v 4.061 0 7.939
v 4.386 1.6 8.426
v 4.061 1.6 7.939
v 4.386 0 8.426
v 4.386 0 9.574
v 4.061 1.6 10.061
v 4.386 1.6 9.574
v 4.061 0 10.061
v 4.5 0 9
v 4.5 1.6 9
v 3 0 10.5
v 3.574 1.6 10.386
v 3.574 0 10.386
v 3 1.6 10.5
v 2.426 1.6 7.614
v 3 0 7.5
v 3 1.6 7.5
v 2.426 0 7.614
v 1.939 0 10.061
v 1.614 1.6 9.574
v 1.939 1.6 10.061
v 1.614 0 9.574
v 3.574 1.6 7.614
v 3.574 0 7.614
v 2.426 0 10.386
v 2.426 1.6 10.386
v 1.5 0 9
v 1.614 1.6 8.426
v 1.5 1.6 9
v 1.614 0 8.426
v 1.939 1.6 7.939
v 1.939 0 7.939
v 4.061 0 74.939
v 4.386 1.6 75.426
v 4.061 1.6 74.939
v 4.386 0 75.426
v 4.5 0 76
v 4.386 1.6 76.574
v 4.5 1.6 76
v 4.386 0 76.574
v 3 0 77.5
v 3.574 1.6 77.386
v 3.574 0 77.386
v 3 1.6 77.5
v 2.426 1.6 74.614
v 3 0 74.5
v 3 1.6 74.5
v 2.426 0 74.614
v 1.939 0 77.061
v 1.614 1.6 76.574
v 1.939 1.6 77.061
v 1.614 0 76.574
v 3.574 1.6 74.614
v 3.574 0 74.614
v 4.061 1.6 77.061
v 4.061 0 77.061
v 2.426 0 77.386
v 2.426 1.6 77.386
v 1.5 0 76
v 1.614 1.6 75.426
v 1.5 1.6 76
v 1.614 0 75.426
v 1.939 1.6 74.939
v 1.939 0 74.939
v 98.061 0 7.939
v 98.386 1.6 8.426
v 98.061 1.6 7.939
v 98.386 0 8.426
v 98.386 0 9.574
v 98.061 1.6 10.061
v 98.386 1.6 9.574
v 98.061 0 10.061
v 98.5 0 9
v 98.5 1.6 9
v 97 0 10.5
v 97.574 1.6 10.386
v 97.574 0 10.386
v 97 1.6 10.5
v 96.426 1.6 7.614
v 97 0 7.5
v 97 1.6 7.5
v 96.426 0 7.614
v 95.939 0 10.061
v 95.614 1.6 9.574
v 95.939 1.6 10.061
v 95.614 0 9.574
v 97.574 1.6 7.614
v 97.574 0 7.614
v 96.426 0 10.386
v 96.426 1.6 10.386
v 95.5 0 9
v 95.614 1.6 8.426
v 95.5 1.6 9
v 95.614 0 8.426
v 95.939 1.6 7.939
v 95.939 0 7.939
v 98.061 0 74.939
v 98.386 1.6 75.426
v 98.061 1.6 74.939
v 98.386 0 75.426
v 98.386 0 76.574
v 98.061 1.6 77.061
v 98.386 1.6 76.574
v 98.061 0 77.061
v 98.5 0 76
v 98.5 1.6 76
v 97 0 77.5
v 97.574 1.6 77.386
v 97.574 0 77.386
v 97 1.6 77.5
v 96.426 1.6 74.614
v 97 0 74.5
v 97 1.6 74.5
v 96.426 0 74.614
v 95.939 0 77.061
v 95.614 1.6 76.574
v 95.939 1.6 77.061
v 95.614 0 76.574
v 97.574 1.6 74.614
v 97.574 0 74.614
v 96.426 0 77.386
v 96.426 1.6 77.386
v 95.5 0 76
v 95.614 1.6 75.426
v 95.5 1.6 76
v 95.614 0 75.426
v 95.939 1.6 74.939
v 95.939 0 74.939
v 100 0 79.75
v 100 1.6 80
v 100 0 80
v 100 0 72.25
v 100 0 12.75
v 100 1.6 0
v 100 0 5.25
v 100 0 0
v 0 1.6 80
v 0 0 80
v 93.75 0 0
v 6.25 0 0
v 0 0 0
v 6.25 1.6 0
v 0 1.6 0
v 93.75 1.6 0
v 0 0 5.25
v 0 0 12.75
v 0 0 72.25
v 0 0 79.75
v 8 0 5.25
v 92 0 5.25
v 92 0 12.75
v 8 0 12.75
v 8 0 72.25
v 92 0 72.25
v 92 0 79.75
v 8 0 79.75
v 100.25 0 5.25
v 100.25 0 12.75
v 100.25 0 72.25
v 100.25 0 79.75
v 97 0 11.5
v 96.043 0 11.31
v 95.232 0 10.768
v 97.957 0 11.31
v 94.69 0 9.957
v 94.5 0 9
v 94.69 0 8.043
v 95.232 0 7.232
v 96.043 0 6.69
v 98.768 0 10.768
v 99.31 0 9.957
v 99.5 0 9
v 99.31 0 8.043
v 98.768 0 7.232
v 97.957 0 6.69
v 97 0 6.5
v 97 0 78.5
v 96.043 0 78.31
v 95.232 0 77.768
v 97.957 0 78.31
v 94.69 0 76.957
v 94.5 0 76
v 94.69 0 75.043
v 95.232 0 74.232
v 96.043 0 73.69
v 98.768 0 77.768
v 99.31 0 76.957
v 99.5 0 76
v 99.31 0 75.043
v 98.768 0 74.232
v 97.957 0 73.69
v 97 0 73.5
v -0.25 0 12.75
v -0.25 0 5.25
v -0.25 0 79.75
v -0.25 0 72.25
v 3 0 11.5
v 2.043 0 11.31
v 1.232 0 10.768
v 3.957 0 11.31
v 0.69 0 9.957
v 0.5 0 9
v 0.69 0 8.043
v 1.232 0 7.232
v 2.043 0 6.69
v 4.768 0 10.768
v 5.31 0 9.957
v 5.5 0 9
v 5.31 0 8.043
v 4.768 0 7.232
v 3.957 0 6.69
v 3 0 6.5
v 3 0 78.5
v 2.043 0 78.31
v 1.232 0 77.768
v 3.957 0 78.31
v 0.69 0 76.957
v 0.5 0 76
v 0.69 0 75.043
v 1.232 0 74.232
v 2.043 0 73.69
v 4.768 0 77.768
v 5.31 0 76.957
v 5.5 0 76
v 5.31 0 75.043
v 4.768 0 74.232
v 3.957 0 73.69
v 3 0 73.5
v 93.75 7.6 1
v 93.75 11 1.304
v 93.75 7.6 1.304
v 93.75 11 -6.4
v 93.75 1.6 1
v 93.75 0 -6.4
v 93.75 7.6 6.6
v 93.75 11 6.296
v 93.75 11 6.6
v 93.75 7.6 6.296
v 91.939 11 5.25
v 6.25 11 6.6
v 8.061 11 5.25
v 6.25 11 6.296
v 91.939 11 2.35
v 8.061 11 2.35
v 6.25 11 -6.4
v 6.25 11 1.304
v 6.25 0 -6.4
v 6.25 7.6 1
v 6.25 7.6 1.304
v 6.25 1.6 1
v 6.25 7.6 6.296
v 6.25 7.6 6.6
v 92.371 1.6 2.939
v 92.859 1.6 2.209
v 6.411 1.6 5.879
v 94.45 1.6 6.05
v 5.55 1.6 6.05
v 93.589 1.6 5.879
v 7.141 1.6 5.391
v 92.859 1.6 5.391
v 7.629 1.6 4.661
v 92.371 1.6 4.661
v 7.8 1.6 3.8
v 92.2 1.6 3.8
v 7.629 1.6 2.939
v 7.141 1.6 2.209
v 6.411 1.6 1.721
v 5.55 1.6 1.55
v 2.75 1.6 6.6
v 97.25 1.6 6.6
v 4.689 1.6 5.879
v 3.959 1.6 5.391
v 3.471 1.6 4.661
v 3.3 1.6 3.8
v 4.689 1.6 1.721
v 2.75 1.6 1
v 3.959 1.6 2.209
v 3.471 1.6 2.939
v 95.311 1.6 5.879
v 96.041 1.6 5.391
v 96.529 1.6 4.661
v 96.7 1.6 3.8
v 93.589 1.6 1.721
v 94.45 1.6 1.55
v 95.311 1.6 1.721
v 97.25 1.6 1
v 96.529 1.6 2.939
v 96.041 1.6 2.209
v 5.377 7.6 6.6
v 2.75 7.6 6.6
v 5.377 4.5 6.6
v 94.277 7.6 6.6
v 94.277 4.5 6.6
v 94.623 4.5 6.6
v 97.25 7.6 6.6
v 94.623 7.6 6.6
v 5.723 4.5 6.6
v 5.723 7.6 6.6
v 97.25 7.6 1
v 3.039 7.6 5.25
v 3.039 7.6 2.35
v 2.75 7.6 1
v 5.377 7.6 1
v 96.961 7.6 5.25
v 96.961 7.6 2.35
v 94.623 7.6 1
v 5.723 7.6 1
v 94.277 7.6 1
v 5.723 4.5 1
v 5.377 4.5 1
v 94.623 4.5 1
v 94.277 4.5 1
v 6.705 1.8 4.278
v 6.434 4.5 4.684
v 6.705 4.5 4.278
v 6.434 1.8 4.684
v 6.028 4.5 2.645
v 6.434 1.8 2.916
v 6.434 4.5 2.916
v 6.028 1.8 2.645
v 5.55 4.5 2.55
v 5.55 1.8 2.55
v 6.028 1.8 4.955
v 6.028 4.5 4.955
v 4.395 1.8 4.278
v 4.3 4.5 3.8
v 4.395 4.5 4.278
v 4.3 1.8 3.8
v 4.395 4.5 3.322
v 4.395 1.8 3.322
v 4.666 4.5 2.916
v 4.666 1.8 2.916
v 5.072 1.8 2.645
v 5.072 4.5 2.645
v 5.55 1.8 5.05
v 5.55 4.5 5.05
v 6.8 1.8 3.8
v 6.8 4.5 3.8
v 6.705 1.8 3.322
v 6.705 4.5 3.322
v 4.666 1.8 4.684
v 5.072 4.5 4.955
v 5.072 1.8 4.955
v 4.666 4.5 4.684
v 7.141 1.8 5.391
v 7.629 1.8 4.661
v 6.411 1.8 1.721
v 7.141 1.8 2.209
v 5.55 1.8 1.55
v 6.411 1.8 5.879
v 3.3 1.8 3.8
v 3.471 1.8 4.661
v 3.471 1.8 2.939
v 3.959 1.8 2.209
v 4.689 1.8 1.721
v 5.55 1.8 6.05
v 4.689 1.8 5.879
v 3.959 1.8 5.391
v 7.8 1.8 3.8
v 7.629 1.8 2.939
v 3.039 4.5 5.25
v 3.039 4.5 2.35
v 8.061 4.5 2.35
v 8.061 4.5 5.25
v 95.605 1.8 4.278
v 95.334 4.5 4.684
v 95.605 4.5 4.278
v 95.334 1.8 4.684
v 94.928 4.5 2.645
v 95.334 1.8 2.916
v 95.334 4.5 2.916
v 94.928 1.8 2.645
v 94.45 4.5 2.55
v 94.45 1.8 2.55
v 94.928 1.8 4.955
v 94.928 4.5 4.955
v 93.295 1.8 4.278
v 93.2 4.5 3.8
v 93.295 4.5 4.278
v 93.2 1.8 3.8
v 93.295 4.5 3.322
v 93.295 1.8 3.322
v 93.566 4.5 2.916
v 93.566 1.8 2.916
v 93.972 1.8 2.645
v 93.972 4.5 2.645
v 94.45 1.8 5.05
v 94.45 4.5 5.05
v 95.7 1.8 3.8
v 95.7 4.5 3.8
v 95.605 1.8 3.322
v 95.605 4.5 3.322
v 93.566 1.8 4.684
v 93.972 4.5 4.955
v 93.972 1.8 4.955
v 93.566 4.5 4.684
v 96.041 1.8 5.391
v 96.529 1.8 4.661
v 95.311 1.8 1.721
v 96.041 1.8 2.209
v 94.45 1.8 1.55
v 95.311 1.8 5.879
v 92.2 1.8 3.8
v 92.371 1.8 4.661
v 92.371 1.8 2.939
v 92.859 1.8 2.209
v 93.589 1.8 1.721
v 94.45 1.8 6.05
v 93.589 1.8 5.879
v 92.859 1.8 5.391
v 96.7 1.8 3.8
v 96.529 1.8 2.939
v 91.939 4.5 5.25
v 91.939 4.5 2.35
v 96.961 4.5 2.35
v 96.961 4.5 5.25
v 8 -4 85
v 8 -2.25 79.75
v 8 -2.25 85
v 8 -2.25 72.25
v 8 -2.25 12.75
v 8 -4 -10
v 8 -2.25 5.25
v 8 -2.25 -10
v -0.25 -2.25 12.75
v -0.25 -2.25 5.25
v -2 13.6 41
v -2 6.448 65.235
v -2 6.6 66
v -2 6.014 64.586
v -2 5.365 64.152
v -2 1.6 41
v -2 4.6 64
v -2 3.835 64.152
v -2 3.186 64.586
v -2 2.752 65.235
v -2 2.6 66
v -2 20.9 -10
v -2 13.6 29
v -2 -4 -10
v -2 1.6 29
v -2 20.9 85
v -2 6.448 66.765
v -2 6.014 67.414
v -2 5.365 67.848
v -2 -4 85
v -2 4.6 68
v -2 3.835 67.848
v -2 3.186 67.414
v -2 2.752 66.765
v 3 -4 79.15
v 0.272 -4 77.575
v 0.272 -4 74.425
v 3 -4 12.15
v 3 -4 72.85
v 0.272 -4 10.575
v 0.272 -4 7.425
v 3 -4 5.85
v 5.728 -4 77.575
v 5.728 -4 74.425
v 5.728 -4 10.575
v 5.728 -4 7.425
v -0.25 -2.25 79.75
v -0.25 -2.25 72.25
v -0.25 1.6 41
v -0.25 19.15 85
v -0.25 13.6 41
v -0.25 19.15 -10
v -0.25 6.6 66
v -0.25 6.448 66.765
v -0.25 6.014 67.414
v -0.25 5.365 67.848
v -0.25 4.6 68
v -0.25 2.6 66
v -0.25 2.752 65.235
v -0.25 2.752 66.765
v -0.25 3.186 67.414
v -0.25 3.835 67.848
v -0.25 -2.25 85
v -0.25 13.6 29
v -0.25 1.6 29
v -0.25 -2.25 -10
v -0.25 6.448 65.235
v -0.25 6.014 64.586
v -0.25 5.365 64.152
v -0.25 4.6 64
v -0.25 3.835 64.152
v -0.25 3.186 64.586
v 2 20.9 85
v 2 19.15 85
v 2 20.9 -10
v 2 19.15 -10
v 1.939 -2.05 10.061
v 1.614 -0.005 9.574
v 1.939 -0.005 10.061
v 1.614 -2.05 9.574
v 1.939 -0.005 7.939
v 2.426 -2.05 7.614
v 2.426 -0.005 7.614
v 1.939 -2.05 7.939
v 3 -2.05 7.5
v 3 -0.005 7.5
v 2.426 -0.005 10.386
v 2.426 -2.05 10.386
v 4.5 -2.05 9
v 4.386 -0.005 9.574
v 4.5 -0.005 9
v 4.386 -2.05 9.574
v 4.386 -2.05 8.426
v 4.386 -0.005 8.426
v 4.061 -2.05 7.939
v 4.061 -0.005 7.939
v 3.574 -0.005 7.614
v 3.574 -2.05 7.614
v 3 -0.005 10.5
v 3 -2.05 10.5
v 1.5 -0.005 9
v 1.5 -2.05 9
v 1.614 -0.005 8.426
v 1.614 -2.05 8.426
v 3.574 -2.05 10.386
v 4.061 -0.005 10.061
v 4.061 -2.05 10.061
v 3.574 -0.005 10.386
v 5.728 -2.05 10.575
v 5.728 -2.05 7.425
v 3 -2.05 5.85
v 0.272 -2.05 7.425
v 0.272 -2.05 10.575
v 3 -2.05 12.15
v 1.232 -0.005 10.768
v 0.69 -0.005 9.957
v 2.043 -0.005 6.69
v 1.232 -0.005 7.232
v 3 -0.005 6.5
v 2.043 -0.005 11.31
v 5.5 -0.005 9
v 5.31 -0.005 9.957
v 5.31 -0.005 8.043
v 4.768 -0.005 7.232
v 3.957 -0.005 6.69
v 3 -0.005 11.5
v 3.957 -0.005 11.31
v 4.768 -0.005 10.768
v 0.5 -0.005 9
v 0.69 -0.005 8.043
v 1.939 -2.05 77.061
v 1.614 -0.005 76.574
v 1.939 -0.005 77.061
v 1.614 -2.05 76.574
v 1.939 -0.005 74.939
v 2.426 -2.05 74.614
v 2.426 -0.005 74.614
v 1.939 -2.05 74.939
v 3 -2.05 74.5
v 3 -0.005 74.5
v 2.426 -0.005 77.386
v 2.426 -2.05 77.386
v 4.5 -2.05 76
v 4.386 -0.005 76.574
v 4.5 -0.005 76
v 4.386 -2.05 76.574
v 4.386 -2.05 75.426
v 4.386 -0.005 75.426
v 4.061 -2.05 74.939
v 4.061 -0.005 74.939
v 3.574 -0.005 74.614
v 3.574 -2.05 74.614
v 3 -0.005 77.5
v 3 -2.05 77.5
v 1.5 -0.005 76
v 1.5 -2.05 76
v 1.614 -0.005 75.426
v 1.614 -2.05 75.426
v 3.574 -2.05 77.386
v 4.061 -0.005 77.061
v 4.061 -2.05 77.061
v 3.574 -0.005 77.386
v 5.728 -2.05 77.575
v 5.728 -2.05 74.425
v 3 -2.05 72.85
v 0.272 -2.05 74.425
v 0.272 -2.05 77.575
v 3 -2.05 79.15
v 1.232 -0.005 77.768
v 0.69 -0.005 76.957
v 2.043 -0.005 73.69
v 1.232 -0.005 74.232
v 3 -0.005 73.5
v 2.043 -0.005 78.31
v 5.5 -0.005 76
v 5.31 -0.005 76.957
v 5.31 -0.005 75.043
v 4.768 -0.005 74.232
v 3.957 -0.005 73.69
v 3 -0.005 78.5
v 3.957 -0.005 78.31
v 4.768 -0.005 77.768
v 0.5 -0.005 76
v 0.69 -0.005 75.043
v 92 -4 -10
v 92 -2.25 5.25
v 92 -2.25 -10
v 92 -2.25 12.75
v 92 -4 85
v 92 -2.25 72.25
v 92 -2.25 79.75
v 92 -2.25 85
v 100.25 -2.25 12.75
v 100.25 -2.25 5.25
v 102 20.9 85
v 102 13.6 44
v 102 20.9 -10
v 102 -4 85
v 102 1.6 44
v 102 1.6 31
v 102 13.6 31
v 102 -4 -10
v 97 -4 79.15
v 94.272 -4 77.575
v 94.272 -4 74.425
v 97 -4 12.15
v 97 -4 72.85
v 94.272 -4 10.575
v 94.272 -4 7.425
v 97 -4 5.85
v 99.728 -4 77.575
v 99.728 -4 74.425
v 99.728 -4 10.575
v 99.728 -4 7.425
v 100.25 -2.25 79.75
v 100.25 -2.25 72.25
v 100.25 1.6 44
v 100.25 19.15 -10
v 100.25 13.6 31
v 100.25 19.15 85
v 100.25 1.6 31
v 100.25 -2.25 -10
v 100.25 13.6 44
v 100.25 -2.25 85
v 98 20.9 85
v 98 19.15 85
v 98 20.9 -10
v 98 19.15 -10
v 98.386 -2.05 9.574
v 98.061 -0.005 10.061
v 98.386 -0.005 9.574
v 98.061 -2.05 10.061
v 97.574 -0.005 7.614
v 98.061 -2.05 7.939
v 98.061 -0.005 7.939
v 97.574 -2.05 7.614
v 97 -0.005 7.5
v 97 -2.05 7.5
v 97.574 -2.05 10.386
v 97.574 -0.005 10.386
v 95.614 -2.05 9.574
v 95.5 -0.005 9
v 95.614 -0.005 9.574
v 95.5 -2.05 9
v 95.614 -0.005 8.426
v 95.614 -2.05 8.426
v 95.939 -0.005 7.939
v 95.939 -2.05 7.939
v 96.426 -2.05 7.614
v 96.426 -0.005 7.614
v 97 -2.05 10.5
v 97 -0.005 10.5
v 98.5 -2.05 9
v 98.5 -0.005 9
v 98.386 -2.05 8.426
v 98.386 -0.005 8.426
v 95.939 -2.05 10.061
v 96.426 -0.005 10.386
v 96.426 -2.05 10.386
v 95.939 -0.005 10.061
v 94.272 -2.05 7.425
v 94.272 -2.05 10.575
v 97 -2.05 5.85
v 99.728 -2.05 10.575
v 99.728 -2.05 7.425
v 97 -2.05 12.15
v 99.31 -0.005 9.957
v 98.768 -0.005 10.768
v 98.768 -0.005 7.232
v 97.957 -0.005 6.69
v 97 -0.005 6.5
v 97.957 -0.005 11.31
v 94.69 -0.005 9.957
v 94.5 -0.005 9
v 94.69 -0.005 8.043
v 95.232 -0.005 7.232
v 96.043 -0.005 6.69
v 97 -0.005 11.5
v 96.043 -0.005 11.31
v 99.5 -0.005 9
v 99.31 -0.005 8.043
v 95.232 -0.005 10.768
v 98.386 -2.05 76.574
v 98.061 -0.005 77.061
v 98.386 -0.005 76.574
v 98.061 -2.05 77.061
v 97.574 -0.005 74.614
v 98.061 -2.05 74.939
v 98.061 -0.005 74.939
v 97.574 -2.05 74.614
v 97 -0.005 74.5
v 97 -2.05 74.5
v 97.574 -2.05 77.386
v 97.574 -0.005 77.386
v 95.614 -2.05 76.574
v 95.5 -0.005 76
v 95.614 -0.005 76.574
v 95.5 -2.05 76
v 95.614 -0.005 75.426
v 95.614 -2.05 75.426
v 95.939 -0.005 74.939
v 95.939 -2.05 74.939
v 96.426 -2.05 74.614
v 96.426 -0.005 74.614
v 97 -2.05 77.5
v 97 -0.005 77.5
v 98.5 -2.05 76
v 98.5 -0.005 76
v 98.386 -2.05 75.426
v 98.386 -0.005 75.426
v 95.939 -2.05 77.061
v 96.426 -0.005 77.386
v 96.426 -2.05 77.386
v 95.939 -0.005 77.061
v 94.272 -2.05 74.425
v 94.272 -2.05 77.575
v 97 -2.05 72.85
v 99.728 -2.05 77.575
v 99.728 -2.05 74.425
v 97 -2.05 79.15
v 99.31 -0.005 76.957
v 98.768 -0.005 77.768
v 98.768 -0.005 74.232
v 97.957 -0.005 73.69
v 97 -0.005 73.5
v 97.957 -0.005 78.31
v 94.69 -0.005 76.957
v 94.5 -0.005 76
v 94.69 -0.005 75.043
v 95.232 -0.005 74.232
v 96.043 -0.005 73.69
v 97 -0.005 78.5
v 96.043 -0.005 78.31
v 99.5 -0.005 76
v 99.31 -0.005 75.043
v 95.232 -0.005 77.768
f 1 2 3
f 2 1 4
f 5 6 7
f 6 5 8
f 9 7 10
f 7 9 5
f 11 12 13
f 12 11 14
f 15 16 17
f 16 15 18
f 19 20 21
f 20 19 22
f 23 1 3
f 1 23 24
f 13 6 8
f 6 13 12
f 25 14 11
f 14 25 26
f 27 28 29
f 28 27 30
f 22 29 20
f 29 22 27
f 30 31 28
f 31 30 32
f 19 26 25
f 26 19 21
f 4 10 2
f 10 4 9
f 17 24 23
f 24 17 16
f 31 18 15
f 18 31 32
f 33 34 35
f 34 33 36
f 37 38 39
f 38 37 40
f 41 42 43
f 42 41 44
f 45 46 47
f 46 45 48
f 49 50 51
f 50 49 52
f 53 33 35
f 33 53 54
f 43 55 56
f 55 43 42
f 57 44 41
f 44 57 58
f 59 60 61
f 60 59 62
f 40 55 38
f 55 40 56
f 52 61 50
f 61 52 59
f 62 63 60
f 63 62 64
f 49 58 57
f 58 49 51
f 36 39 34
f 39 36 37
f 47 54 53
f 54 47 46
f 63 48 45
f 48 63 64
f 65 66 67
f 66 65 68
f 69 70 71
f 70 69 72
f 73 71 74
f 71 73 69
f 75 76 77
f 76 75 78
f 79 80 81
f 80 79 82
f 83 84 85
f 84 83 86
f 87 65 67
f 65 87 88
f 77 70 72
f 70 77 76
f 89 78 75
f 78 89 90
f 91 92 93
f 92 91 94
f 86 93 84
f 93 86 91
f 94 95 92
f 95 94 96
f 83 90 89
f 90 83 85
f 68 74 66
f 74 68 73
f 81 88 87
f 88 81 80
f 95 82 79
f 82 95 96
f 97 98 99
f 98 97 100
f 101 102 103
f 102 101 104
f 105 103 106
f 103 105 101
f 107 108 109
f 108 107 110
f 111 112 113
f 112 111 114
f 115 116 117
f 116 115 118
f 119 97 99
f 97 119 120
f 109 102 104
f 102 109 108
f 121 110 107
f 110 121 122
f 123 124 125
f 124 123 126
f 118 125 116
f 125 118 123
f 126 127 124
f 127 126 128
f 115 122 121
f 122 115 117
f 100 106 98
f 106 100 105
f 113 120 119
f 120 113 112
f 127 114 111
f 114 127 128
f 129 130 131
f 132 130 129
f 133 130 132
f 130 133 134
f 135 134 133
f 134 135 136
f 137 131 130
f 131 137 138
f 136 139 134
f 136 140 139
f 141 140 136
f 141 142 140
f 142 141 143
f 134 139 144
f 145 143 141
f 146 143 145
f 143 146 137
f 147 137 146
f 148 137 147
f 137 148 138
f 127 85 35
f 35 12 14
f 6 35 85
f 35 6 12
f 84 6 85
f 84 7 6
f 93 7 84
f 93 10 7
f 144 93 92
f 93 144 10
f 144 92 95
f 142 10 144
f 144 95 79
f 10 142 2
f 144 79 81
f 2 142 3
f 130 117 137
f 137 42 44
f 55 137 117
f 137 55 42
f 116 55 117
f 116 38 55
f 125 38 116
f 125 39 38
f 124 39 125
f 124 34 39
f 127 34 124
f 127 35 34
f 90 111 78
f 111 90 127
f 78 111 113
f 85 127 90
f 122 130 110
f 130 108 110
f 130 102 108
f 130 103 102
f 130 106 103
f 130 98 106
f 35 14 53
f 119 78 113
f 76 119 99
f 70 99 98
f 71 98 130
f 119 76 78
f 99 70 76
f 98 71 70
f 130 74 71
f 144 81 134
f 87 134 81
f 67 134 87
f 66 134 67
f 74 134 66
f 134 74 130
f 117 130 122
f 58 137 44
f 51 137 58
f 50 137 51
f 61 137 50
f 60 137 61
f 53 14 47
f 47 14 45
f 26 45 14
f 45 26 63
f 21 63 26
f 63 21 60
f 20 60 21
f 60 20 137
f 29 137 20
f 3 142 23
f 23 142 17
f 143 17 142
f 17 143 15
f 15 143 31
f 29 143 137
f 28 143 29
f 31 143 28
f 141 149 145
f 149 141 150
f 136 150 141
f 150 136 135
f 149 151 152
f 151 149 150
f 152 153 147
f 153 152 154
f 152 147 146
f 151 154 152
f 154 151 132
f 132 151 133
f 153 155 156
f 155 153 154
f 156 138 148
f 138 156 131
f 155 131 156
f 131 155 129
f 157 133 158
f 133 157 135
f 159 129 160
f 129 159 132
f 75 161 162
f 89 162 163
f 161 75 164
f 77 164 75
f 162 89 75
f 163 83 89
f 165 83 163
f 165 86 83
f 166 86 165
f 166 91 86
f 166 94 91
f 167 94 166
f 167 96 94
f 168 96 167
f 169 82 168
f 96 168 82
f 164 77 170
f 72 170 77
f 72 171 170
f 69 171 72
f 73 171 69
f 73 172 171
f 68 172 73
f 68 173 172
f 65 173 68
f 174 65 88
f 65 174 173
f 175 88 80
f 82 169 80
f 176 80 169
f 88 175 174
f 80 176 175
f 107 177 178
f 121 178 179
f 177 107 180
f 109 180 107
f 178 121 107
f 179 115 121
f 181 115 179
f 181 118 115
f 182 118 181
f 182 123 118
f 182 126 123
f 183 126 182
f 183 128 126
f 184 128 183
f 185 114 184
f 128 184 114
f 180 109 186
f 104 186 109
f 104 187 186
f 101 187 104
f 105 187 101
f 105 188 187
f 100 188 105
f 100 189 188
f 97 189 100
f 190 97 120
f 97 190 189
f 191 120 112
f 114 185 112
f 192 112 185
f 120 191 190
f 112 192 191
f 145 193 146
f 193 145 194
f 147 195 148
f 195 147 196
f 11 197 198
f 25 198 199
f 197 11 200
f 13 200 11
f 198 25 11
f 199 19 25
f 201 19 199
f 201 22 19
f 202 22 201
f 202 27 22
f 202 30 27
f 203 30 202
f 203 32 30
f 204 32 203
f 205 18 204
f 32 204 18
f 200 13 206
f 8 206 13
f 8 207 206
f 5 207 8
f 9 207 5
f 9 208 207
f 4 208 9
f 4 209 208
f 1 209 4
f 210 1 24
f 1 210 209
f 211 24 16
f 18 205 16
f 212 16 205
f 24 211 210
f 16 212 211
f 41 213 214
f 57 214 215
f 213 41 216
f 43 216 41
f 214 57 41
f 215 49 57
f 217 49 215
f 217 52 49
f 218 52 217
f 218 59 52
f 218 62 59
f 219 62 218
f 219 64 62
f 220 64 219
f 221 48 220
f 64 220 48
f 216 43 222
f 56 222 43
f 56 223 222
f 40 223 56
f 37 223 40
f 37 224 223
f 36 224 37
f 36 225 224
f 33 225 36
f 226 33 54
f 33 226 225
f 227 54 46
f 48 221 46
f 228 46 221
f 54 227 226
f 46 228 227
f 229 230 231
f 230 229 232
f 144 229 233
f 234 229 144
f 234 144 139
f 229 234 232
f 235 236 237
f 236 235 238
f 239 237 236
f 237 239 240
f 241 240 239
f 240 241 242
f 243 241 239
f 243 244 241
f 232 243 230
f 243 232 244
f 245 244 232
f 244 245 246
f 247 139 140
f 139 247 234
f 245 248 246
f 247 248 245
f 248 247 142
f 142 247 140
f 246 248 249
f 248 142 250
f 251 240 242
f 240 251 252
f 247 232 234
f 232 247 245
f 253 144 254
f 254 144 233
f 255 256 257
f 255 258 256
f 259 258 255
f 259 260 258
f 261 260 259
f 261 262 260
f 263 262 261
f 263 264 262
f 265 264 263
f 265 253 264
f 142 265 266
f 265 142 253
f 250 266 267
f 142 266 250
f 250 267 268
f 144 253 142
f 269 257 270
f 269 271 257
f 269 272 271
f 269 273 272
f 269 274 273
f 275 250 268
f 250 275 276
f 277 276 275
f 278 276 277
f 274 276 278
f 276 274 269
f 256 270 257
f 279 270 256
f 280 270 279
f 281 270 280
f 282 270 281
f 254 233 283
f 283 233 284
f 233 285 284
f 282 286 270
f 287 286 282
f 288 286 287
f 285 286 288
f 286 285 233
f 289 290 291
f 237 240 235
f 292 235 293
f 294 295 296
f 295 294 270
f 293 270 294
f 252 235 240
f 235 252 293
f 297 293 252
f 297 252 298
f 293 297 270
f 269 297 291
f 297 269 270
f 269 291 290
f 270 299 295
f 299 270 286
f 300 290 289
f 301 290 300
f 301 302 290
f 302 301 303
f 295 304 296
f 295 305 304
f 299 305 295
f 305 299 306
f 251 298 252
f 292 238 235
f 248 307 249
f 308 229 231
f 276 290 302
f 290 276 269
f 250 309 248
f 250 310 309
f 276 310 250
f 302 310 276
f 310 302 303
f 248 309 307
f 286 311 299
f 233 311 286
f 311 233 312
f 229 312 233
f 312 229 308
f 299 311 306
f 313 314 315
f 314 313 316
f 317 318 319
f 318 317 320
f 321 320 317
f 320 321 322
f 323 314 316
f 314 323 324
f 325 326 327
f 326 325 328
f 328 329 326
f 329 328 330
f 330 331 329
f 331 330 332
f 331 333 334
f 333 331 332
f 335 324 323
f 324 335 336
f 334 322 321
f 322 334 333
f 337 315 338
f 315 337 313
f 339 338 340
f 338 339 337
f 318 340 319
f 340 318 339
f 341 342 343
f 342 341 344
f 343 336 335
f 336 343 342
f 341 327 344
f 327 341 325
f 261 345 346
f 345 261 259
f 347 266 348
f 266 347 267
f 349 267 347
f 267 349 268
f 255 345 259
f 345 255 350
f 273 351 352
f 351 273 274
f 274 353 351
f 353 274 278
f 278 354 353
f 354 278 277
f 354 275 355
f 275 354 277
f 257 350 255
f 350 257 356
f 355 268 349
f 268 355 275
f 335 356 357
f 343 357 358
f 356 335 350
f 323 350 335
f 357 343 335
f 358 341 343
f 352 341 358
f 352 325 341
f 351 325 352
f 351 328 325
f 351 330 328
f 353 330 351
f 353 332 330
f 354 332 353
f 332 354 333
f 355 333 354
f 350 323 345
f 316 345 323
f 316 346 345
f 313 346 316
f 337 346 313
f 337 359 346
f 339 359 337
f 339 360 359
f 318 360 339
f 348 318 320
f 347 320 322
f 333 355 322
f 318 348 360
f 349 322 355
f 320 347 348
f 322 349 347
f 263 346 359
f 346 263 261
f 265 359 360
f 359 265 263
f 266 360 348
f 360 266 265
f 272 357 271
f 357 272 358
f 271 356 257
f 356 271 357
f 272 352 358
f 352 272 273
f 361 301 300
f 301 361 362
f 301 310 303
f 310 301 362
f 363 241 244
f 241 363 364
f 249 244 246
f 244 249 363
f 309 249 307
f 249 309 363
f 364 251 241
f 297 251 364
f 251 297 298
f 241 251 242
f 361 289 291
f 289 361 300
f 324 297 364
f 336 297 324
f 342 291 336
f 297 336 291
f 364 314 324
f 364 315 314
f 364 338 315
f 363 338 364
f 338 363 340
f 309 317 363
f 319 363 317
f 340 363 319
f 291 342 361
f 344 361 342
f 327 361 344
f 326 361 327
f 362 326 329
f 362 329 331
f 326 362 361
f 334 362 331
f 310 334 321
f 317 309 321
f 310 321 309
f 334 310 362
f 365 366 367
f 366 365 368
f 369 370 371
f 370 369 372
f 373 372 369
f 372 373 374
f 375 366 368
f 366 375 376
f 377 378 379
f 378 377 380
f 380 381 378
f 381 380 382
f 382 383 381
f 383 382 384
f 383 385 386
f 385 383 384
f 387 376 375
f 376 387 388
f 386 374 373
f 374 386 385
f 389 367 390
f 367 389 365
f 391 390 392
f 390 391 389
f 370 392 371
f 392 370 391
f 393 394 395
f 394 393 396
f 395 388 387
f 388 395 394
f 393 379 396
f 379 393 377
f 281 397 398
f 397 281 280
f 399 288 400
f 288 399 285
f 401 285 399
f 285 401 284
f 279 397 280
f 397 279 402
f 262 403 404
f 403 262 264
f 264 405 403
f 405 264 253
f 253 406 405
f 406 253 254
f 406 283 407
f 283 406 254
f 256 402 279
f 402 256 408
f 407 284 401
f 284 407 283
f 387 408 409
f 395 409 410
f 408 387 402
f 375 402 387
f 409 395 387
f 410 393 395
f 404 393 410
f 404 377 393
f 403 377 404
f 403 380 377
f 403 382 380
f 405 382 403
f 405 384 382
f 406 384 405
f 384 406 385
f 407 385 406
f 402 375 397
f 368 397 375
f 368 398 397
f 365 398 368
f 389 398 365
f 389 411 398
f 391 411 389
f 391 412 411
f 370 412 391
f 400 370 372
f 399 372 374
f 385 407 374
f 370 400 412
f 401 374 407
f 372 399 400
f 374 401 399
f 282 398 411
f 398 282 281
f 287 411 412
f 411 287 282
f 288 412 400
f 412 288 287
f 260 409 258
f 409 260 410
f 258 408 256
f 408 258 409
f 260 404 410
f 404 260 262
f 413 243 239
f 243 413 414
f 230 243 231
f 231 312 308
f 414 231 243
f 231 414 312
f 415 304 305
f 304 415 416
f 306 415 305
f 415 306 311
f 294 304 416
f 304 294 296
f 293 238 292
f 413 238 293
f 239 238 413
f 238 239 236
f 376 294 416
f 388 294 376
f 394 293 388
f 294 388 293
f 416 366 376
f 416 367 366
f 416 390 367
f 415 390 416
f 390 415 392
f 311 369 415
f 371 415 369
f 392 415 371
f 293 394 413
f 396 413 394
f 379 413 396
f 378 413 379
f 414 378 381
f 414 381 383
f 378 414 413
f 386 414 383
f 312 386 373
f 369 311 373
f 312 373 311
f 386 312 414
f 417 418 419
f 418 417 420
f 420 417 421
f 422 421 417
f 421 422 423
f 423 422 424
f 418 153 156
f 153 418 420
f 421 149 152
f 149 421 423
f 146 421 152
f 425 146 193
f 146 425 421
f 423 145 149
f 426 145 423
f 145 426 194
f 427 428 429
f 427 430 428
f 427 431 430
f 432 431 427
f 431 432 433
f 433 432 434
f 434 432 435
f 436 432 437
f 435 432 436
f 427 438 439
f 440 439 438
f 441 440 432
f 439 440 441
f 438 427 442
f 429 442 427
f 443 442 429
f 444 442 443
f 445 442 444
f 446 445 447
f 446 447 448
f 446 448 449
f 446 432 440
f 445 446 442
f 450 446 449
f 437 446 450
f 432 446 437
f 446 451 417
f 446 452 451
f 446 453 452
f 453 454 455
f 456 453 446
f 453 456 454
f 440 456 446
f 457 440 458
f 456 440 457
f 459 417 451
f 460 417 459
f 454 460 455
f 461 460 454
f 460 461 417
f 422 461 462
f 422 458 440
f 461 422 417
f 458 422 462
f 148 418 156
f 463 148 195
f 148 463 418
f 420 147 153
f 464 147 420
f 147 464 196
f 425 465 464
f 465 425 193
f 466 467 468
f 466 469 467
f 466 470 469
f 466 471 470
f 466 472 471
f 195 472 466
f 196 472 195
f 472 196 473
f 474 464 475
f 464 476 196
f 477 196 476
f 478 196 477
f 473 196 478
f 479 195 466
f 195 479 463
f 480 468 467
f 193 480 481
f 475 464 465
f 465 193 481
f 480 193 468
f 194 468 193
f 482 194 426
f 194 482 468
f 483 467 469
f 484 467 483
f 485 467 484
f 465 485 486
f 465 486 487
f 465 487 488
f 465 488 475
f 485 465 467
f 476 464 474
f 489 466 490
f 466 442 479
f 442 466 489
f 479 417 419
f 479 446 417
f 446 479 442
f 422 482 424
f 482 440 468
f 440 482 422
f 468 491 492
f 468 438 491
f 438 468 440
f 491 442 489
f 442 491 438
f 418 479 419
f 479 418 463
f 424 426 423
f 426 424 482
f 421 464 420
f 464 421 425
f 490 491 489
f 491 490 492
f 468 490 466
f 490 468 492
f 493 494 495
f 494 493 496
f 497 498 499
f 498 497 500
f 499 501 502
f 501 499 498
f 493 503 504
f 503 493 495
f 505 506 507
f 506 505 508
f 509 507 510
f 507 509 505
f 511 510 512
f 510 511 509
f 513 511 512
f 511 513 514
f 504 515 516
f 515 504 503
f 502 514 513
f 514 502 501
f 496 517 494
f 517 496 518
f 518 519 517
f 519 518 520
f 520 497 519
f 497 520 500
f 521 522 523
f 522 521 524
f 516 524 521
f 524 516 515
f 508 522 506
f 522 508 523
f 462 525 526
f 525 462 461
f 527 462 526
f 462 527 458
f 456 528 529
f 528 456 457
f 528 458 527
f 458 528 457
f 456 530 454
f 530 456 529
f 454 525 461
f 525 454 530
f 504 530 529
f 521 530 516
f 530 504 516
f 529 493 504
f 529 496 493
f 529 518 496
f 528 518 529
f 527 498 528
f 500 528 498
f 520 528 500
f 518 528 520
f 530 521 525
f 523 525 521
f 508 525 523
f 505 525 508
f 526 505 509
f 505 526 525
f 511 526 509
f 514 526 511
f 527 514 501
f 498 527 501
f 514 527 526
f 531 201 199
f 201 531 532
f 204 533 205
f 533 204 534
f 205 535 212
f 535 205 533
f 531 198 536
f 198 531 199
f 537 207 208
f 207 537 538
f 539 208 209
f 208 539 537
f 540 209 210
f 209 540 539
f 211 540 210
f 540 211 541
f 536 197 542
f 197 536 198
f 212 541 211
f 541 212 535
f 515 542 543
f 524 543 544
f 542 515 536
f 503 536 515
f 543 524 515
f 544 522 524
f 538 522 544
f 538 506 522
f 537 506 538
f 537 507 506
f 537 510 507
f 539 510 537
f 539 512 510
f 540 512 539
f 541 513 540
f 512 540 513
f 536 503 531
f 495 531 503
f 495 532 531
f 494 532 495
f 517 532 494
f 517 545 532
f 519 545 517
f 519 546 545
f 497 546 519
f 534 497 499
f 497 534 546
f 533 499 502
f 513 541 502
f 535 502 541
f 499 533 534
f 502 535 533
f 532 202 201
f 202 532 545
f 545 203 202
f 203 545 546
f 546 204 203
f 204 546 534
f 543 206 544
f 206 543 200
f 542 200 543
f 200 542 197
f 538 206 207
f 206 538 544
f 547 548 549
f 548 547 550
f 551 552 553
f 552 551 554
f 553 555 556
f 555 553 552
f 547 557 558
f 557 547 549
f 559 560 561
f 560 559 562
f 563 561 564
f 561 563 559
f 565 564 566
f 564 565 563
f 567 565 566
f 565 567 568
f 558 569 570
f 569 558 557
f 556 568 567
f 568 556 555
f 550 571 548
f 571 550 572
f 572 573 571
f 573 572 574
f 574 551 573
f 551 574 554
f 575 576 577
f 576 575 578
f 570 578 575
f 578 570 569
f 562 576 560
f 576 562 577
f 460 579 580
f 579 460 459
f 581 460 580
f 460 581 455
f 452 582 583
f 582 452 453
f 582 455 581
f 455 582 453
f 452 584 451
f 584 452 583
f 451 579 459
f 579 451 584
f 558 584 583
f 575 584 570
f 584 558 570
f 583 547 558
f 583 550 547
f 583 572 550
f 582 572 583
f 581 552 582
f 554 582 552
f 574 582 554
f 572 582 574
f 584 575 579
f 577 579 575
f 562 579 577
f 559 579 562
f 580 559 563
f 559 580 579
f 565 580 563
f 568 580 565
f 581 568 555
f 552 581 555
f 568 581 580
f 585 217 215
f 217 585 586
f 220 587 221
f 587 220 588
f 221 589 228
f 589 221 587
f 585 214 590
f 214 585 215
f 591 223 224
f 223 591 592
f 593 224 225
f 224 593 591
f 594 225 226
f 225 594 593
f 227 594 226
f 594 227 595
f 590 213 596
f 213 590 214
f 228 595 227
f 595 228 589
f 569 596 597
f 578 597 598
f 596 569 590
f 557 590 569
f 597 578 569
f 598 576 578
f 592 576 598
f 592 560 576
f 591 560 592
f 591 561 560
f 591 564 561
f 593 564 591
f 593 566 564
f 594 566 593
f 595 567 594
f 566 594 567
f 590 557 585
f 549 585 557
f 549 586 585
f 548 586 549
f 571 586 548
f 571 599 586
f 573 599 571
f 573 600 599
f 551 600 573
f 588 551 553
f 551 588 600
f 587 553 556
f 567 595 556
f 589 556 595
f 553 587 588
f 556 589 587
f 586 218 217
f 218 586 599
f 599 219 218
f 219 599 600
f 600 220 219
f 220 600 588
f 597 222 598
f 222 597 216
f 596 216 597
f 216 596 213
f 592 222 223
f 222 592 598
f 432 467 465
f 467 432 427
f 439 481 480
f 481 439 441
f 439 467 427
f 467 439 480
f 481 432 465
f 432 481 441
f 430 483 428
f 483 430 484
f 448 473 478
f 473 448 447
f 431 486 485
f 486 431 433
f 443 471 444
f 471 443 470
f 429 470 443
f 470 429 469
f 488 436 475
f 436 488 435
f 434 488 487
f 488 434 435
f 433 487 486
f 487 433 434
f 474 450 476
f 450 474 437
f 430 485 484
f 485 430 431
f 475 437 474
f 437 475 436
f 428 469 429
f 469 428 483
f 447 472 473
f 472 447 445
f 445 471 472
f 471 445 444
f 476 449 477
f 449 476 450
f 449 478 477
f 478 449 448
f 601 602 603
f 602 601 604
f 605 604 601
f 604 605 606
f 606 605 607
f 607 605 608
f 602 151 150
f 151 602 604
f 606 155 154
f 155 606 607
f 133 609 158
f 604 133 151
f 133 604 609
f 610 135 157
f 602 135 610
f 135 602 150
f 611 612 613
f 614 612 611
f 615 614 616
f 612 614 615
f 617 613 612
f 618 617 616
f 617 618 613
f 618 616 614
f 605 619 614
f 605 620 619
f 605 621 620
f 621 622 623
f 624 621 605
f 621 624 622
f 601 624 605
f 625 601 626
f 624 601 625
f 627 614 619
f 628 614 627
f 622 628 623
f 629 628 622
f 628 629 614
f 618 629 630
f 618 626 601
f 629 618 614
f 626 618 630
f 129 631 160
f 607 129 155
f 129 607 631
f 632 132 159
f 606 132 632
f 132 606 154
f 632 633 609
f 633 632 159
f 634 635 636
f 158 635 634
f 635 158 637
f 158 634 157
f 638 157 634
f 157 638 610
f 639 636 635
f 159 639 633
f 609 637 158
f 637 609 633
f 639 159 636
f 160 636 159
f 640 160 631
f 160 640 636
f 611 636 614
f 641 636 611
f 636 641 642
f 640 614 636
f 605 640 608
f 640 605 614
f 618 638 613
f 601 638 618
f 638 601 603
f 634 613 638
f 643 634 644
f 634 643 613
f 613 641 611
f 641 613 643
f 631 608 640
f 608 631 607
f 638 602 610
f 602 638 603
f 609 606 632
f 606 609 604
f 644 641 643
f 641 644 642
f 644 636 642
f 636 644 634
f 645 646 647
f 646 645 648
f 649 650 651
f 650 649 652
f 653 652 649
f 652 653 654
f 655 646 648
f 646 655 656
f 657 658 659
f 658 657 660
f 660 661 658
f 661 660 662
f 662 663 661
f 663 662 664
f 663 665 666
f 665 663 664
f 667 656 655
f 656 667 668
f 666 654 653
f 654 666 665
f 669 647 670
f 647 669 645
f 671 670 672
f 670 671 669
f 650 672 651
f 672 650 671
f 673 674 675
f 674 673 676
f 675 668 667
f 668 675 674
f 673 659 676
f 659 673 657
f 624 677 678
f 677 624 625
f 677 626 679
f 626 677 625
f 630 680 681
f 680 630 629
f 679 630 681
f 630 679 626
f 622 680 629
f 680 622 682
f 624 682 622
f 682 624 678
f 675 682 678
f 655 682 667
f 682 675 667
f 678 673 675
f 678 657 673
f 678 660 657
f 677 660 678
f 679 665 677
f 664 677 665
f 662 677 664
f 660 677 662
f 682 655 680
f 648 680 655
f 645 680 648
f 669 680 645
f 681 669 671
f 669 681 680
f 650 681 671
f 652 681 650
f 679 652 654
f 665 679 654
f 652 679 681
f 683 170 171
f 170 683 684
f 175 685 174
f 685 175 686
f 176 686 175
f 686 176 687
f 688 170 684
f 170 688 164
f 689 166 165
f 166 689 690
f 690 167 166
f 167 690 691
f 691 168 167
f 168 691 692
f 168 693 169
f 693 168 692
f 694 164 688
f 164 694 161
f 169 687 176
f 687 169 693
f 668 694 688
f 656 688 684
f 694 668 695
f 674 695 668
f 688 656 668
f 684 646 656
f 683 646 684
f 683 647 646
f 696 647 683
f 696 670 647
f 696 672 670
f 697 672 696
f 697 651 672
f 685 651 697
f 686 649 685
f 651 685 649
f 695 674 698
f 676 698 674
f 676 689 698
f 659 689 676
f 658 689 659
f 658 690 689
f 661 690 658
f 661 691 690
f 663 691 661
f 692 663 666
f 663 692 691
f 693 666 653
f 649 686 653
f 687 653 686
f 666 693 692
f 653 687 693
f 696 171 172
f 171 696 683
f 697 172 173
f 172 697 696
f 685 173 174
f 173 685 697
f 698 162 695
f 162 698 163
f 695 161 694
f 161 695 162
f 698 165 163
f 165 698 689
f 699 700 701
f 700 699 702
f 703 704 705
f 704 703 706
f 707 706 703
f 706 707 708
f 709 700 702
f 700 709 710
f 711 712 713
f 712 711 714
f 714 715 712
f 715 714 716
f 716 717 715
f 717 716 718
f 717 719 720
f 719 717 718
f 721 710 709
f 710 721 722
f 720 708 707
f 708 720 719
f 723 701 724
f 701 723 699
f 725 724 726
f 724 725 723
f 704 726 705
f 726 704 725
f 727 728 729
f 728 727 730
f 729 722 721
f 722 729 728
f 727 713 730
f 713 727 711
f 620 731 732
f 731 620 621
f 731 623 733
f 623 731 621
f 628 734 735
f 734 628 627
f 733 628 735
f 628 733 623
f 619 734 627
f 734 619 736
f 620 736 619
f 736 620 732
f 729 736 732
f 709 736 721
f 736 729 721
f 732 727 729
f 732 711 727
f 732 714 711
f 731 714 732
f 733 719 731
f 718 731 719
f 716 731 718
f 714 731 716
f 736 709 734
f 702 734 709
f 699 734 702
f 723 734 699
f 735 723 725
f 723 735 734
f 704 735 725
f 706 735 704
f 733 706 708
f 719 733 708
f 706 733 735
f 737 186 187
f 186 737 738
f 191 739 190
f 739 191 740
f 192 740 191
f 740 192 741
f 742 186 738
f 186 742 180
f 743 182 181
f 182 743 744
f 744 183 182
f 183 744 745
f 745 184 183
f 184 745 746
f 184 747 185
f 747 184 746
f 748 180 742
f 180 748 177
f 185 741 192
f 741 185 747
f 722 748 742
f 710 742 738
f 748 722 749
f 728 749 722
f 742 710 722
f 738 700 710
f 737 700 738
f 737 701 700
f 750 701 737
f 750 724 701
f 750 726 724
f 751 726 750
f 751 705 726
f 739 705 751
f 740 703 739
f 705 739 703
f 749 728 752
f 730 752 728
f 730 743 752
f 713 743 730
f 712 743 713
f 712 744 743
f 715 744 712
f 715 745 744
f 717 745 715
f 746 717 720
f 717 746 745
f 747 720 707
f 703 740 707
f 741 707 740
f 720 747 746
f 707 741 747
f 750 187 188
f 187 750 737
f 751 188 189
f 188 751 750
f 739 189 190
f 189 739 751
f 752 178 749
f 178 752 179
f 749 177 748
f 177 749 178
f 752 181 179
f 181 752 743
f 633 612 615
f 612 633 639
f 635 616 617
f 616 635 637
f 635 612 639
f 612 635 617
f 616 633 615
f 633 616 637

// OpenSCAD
// file: ../library/din41612/din41612_male.scad
// din41612 male connector
// =======================

include <din41612_male_dim.scad>

use <../linurs/linurs_screw.scad>

module din41612_male(){ 
  // color("LightGrey")
  difference(){
    union(){
        translate([0,din41612_male_w1/2,din41612_male_h/2-din41612_male_h1])  
        cube([din41612_male_l1,
              din41612_male_w1,
              din41612_male_h],
             center=true);  
      translate([0,(din41612_male_w1-din41612_male_w)/2,(din41612_male_h-din41612_male_h1)/2]) 
        cube([din41612_male_l1,
              (din41612_male_w-din41612_male_w1),
              din41612_male_h-din41612_male_h1],
             center=true);  
      translate([0,din41612_male_w2/2+din41612_male_w1-din41612_male_w,din41612_male_h2/2])
        cube([din41612_male_l,
              din41612_male_w2,
              din41612_male_h2],
             center=true);  
    }
    for(i=[-1,1]){ // mounting holes
      translate([i*din41612_male_dl/2,
                 din41612_male_w1-din41612_male_w+din41612_male_w2/2, 
                 din41612_male_h1])
      rotate([180,0,90])screw_fix(
            w=din41612_male_h2, 
            d=M2_5, 
            type=head_cyl, 
            nut_sink=din41612_male_h,
            t=0);
    }
  }
}
din41612_male();  
// file: ../library/din41612/din41612_male_dim.scad
include <../linurs/linurs_screw_dim.scad>

// connector dimensions
din41612_male_l=94.5;    // lenght of the connector
din41612_male_l1=87.5;   // 
din41612_male_w=13;      // width of the connector
din41612_male_w1=6.4;    // 
din41612_male_w2=5.6;    // 
din41612_male_h=11;      // height of the connector
din41612_male_h1=1.6;    // 
din41612_male_h2=6;      // 

din41612_male_dl=88.9;   // distance between mounting holes
// file: ../library/din41612/din41612_female_dim.scad
include <../linurs/linurs_screw_dim.scad>

// connector dimensions
din41612_female_l=95;       // lenght of the connector
din41612_female_l1=85;      // lenght of the connector head
din41612_female_h=11.6;     // height of the connector
din41612_female_h1=5.2;     // height produced by the connector when pulgged in 
din41612_female_w=11;       // width of the connector
din41612_female_w1=8.5;     // width of the connector head

din41612_female_dl=90;      // distance between mounting holes
// file: ../pcb/pcb.scad
// pcb
// ===
// The pcb is the master object and has its 
// lower left corner solder side at the origin of the 
// coordinate system 

n=2;  // [1,2,3,4,5,6,7,8]
show_pcb="assemblies"; // [assemblies,assembly,pcb]

include <pcb_dim.scad>
include <../motherboard/motherboard_dim.scad>

use <../library/din41612/din41612_male.scad>

module pcb(){
  echo("pcb");  
  color("greenyellow")
  difference(){
    cube([pcb_l,pcb_h,pcb_w]); // pcb
    for(x=[-1,1]){ // mounting holes
      for(y=[pcb_wd1,pcb_wd1+pcb_wd]){
        translate([x*pcb_ld/2+pcb_l/2,0,y])
        rotate([90,0,0])
        cylinder(d=pcb_d,h=3*pcb_h,center=true,$fn=16);
      }
    }
  }
}

module pcb_assembly(){
  echo("pcb assembly");  
  pcb();  
  translate([pcb_l/2,pcb_h,0])  
  rotate([-90,0,0])din41612_male();  
}

module pcb_assemblies(n=1){
  echo("pcb assemblies"); 
  for(i=[0:n-1]){ // add the connectors
      echo(i);
      translate([0,step*i,0])
      pcb_assembly();
  }    
}    

if(show_pcb=="assemblies"){
  pcb_assemblies(n=n);
}

if(show_pcb=="assembly"){
  pcb_assembly();
}

if(show_pcb=="pcb"){
    // Move to center to create 2D drawings from top view 
    // with script OpenSCAD22d.py
    //
    rotate([90,0,180])
    //
    translate([-pcb_l/2,-pcb_h/2,-pcb_w/2])
    pcb();
}
// file: ../bracket/bracket.scad
// bracket
// =======
// A bracket of the elecbox module
// - type: 0 front bracket, 1 rear bracket
// - width 1..n in steps

// parameters for customizer
// bracket width
n=2; // [1,2,3,4,5,6,7,8]
// type
bracket="Front"; // [Front,Back]
// intermediate mounting holes
intermediate=false;  

include <../pcb/pcb_dim.scad>

include <../motherboard/motherboard_dim.scad>
include <../library/linurs/linurs_screw_dim.scad>
include <bracket_dim.scad>

use <../library/linurs/linurs_screw.scad>
    
module back_bracket(n=1, intermediate=false){
  mirror([1,0,0])       // mirror it if desired
  front_bracket(n=n, intermediate=intermediate); 
}
    
module front_bracket(n=1, intermediate=false){
  echo("bracket");  
  //color("White")
  intermediatestep=(intermediate)?step:0; 
  difference(){
    union(){
      translate([-bracket_h2/2-bracket_gap/2,
                 bracket_w(n)/2-bracket_w1,
                 bracket_l/2])  
      cube([bracket_h2,
            bracket_w(n),
            bracket_l],center=true); // create the bracket front
  
      translate([bracket_h/2-bracket_h2-bracket_gap/2,
                 bracket_t/2-bracket_w1,
                 bracket_l/2]) 
      cube([bracket_h,
            bracket_t,
            bracket_l],center=true); // U shape side of the screw
      
      translate([bracket_h1/2-bracket_h2-bracket_gap/2,
                 bracket_w(n)-bracket_w1-bracket_t/2,
                 bracket_l/2]) 
      cube([bracket_h1,
            bracket_t,
            bracket_l],center=true); // U shape where no screw  
      for(x=[1:n]){  // create the mounting hole cubes 
        for(z=[bracket_l1,
               bracket_l1+bracket_ld]){
          translate([ bracket_h/2-bracket_h2-bracket_gap/2,
                     -bracket_w1/2+(x-1)*intermediatestep,
                     z])
          cube([bracket_h,
                bracket_w1,
                bracket_l2],center=true);
        }
      }   
    }
    for(x=[1:n]){ // create the mounting hole 
      for(z=[bracket_l1,
             bracket_l1+bracket_ld]){
        translate([bracket_h3-bracket_h2-bracket_gap/2,
                  -bracket_w1/2+(x-1)*intermediatestep,
                   z])
        rotate([0,90,0])
        rotate([-90,0,0])
        screw_fix(w=bracket_w1,d=bracket_screw,type=head_no, t=bracket_screw_gap);
      }
    }
  }
}

if(bracket=="Front"){
  front_bracket(intermediate=intermediate,n=n);
}

if(bracket=="Back"){
  back_bracket(intermediate=intermediate,n=n);
}
// file: ../library/linurs/linurs_screw.scad
// Metric screws and nuts 
// urs@linurs.org 2019
// It is targeted for 3D printing applications. 
// To look realistic is not the goal (Example: Nuts do not have a hole)

include <linurs_screw_dim.scad>

d=0; //[0:M2_5,1:M3,2:M4,3:M5]
type=0;//[0:head_cyl,1:head_cnt,2:head_no,3:head_hex]
w=15; 
i=10;
nut_sink=0;
screw_sink=0; 
t=0.01;
fn=16;

/* [hex_bolt] */
show_hex_bolt=false;

/* [nut] */
show_nut=false;

/* [screw] */
show_screw=false;

/* [screw_fix] */
show_screw_fix=false;

/* [screw_cut] */
show_screw_cut=false;

/* [nut_cut] */
show_nut_cut=false;
wi=0; 
rot=false;

// functions used multiple times to position nuts and heads
function headh_cyl(d)=screw_cyl[d][1];  // height of cyl screw head
function headh_cnt(d)=screw_cyl[d][1];  // height of cnt screw head
function headh(d,type=head_cyl)=(type==head_cyl ? headh_cyl(d) : (type==head_cnt ? headh_cnt(d) : 0 )); // height of screw head 

function nuth(d)=screw_hex[d][2];   // height of hex nut

// head of a cylinder screw
module screw_head_cyl(d=M3, t=0)
{
  screwhd=screw_cyl[d][0]+t; // diameter of cylinder screw head
  cylinder(d=screwhd,h=headh(d=d, type=head_cyl), center=true,$fn=16); // screw head
}

// head of a countersunk screw
module screw_head_cnt(d=M3, t=0)
{
  screwd=screw_d[d]+t; 
  screwhd=screw_cnt[d][0]+t; // diameter of cylinder screw head
  cylinder(d1=screwd,d2=screwhd,h=headh(d=d,type=head_cnt), center=true,$fn=16); // screw head
}

// head of a hex screw
module screw_head_hex(d=M3, t=0)
{
    translate([0,0,-nuth(d)/2])nut(d=d, t=t);
}

// head of all screws
module screw_head(d=M3, type=head_cyl, t=0)
{ 
  if(type==head_cnt){
    screw_head_cnt(d=d, t=t);
  } else {
    if(type==head_cyl){
      screw_head_cyl(d=d, t=t);
    } else {
       if(type==head_hex){
           screw_head_hex(d=d, t=t); 
       } 
    }    
  }
}

// hex bolt 
module hex_bolt(d=M3, w=10, t=0)
{
  nutd=screw_hex[d][1]+t; // outer diameter of hex bolt
  cylinder(r=nutd/2,h=w+t, center=true,$fn=6); // nut
}

// nut 
module nut(d=M3, t=0)
{
  hex_bolt(d=d, w=nuth(d), t=t);    
}

// screw 
// w outer width of the screw = screw length + head 
module screw(w=10, d=M3, type=head_cyl, t=0){
  screwd=screw_d[d]+t;       // screw diameter
  cylinder(d=screwd, h=w, center=true,$fn=16); // screw thread length
  translate([0,0,w/2-headh(d=d,type=type)/2])
  screw_head(d=d,type=type, t=t);
}

// screw fix
// w outer width of the screw = screw length + head 
// sink additional material below to remove 
// raise additional material above to remove
module screw_fix(w=10, d=M3, type=head_cyl, screw_sink=0, nut_sink=0, t=0){
  screw(w=w, d=d, type=type, t=t);
  translate([0,0,-w/2+nuth(d)/2])
    nut(d=d,t=t);
  //additional material to be removed above the nut  
  translate([0,0,-(w+nut_sink)/2])hex_bolt(d=d,w=nut_sink+0.01,t=t);    
  //additional material to be removed above the screw head
  if(type==head_cnt){  
    translate([0,0,w/2+screw_sink])
    cylinder(d=screw_cnt[d][0]+t,h=screw_sink+0.01,center=true,$fn=16);
  }else{ 
    translate([0,0,(w+screw_sink)/2])
    cylinder(d=screw_cyl[d][0]+t,h=screw_sink+0.01,center=true,$fn=16);
  }     
}

// screw cut
// material to be extracted from object to slide in a counter sunk screw for fixation
// w height of the cut out
// i depth of the screw
module screw_cut(d=M3,w=20,i=10,t=0,fn=32){
    hsh=screw_cnt[d][1];
    ws=screw_cnt[d][0]+t;
    ds=screw_d[d]+t;
    
    translate([i/2,0,-(w-hsh)/2])
      cube([i,ws,hsh],center=true);
    
    translate([0,0,-(w-hsh)/2])
      cylinder(d=ws,h=hsh,center=true,$fn=32);
    
    translate([0,0,-(w-hsh)/2+hsh])
        cylinder(d2=ds, d1=ws, h=hsh,center=true,$fn=fn);
    
    cylinder(h=w, d=ds, center=true, $fn=fn);   
    
    translate([i/2,0,0]) 
        cube([i,ds,w],center=true);
    
    for(y=[-1,1]){
        translate([i/2,y*ds/2,-w/2+hsh])
            rotate([45,0,0])
            cube([i,sqrt(2)*(ws-ds)/2,sqrt(2)*(ws-ds)/2],center=true);
    }
}
//screw_cut();

// nut cut
// material to be extracted from object to slide in a nut for fixation
// w height of the cylinder
// i lenght of the inlet
module nut_cut(w=10, wi=0, d=M3, i=10, t=0, rot=false,type=head_cyl){ 
  r=(rot)?90:0;
  ds=(rot)?screw_hex[d][1]:screw_hex[d][0];
  rotate([0,0,r])nut(d,t);
  translate([i/2,0,0])
    cube([i,ds+t,nuth(d)+t],center=true);
  translate([0,0,-wi])
      if(type==head_cnt){    
          screw(w=w, d=d, type=type, t=t); 
        translate([0,0,w/2])
          cylinder(d=screw_cnt[d][0]+t,h=raise,center=true,$fn=16);
      }
      else{ 
          screw(w=w, d=d, type=type, t=t);   
  //      translate([0,0,0])
          //#cylinder(d=screw_cyl[d][0]+t,h=w,center=true,$fn=16);
      }       
}

if(show_hex_bolt==true){
   hex_bolt(d=d, w=w, t=t);
}

if(show_nut==true){
  nut(d=d, t=t);
}    

if(show_screw==true){
   screw(w=w, d=d, type=type, t=t);
}

if(show_screw_fix==true){
  screw_fix(w=w, d=d, type=type, nut_sink=nut_sink, screw_sink=screw_sink, t=t);
}

if(show_screw_cut==true){
  screw_cut(d=d,w=w,i=i,t=t,$fn=fn);
}    

if(show_nut_cut==true){
  nut_cut(w=w, wi=wi, d=d, i=i, t=t,rot=rot,type=type);
}  
// file: ../library/linurs/linurs_screw_dim.scad
// Metric screws and nuts 
// urs@linurs.org

// contains dimensions of linurs_screw and can be included in other 
// OpenScad files 

// Parameters in this file
// d screw diameter M2_5, M3, ... (enumeration with screw_d)
// t millimeters added to diameters 

// enumerations of metric threads
M2_5=0;
M3=1;
M4=2;
M5=3;

// enumerations screw head type
head_cyl=0; // cylinder
head_cnt=1; // countrsunk
head_no=2;  // no head at all
head_hex=3;  // no head at all

// screw diameters
screw_d=[
2.5, // M2.5
3.0, // M3
4.0, // M4
5.0  // M5
];

// sizes for hex nuts
screw_hex=[
//   s,   e,   h
 [ 5.0, 5.8, 1.7], // M2.5
 [ 5.5, 6.4, 2.0], // M3
 [ 7.0, 8.1, 2.8], // M4
 [ 8.0, 9.2, 3.5]  // M5
];

// sizes for cylinder screw heads
screw_cyl=[
//   d,   h
 [ 4.5, 1.6], // M2.5
 [ 5.5, 2.0], // M3
 [ 7.0, 2.6], // M4
 [ 8.5, 3.3]  // M5
];

// sizes for countersunk screw heads
screw_cnt=[
//   d,   h
 [ 4.7, 1.50], // M2.5
 [ 5.6, 1.65], // M3
 [ 7.4, 2.20], // M4
 [ 9.2, 2.50]  // M5
];
// file: ../motherboard/motherboard_dim.scad
include <../library/linurs/linurs_screw_dim.scad>
include <../library/din41612/din41612_female_dim.scad>
include <../library/din41612/din41612_male_dim.scad>
include <../pcb/pcb_dim.scad>
// motherboard pcb dimensions
motherboard_l=pcb_l;   // pcb width
motherboard_h=1.6;     // pcb thickness
step=25.4;             // distance between modules

function motherboard_w(n)=din41612_female_w+step*(n-1);

screw_motherboard_d=M2_5;
screw_motherboard_l=16;
motherboard_pass=0.5;// gap to fit screws 

motherboard_z_offset=-din41612_male_w1-din41612_female_h1-motherboard_h;
// file: ../bracket/bracket_dim.scad
// bracket

include <../pcb/pcb_dim.scad>
include <../motherboard/motherboard_dim.scad>
include <../library/linurs/linurs_screw_dim.scad>

bracket_screw=M2_5;   // hole for the screw

bracket_gap=0.5;      // gap between bracket to make sure it fits in the box
bracket_screw_gap=0.5;// gap to fit the screw

bracket_l=pcb_w+15;   // height of bracket
bracket_l1=19;        // hole l
bracket_l2=3*screw_d[bracket_screw];
bracket_ld=pcb_wd;    // hole distance

bracket_h=10;         // depth of the U shape at the side of the screw
bracket_h1=4;         // depth of the U shape at the side where no screw is 
bracket_h2=2-bracket_gap/2;   // thickness of bracket
bracket_h3=5;         // hole h

bracket_w1=4;         // height of the mounting hole cube
bracket_tn=2;         // thickness of bracket
bracket_t=bracket_tn-bracket_gap/2;  // thickness of bracket - gap

bracket_offset_z=-10;  // bracket offset in elecbox z axis

function bracket_w(n)=step*n-bracket_gap;
function bracket_w2(n)=step*n-2*bracket_tn;
// file: ../pcb/pcb_dim.scad
// The pcb is the master object of the project
// therefore no other include files from other objects
// are necessary

// pcb constants
pcb_l =100;  // lenght of the pcb
pcb_ld = 94; // hole distance 
pcb_w=80;    // height of the pcb
pcb_wd = 67; // hole distance
pcb_wd1 = 9; // hole to edge distance 
pcb_d=3;     // diameter of holes
pcb_h=1.6;   // thickness
// main file
// MCP2221 module
// ==============

MCP2221="assembly"; // [assembly,front,back,print_front,print_back]

include <../pcb/pcb_dim.scad>
include <../bracket/bracket_dim.scad>
include <../motherboard/motherboard_dim.scad>
include <../library/linurs/linurs_screw_dim.scad>

use <../library/linurs/linurs_screw.scad>
use <../bracket/bracket.scad>
use <../pcb/pcb.scad>

module MCP2221_back(){
    h=12;
    w=13;
    z=31;
    difference(){
        translate([0,0,bracket_offset_z])back_bracket(n=1);
        
        translate([
          0,
          h/2+pcb_h,
          z+w/2])
        cube([
          bracket_h,
          h,
          w],center=true);       
    }
}

module MCP2221_front(){
    h1=12;
    w1=12;
    z1=29;
    
    d2=4;
    h2=3;
    z2=66;
    difference(){
        translate([0,0,bracket_offset_z])front_bracket(n=1);
        
        translate([
          0,
          h1/2+pcb_h,
          z1+w1/2])
        cube([
          bracket_h,
          h1,
          w1],center=true);
        
        translate([
          0,
          h2+pcb_h,
          z2])rotate([0,90,0])
          cylinder(h=bracket_h,d=d2,center=true, $fn=16);          
    }
}

module MCP2221_assembly(){
    pcb_assembly();
    MCP2221_front();
    translate([pcb_l,0,0])MCP2221_back();
}

if(MCP2221=="front"){
  MCP2221_front();
}

if(MCP2221=="back"){
  MCP2221_back();
}

if(MCP2221=="assembly"){
  MCP2221_assembly();
}

if(MCP2221=="print_front"){
  rotate([0,-90,0])
    MCP2221_front();
}

if(MCP2221=="print_back"){
  rotate([0,90,0])MCP2221_back();
}
